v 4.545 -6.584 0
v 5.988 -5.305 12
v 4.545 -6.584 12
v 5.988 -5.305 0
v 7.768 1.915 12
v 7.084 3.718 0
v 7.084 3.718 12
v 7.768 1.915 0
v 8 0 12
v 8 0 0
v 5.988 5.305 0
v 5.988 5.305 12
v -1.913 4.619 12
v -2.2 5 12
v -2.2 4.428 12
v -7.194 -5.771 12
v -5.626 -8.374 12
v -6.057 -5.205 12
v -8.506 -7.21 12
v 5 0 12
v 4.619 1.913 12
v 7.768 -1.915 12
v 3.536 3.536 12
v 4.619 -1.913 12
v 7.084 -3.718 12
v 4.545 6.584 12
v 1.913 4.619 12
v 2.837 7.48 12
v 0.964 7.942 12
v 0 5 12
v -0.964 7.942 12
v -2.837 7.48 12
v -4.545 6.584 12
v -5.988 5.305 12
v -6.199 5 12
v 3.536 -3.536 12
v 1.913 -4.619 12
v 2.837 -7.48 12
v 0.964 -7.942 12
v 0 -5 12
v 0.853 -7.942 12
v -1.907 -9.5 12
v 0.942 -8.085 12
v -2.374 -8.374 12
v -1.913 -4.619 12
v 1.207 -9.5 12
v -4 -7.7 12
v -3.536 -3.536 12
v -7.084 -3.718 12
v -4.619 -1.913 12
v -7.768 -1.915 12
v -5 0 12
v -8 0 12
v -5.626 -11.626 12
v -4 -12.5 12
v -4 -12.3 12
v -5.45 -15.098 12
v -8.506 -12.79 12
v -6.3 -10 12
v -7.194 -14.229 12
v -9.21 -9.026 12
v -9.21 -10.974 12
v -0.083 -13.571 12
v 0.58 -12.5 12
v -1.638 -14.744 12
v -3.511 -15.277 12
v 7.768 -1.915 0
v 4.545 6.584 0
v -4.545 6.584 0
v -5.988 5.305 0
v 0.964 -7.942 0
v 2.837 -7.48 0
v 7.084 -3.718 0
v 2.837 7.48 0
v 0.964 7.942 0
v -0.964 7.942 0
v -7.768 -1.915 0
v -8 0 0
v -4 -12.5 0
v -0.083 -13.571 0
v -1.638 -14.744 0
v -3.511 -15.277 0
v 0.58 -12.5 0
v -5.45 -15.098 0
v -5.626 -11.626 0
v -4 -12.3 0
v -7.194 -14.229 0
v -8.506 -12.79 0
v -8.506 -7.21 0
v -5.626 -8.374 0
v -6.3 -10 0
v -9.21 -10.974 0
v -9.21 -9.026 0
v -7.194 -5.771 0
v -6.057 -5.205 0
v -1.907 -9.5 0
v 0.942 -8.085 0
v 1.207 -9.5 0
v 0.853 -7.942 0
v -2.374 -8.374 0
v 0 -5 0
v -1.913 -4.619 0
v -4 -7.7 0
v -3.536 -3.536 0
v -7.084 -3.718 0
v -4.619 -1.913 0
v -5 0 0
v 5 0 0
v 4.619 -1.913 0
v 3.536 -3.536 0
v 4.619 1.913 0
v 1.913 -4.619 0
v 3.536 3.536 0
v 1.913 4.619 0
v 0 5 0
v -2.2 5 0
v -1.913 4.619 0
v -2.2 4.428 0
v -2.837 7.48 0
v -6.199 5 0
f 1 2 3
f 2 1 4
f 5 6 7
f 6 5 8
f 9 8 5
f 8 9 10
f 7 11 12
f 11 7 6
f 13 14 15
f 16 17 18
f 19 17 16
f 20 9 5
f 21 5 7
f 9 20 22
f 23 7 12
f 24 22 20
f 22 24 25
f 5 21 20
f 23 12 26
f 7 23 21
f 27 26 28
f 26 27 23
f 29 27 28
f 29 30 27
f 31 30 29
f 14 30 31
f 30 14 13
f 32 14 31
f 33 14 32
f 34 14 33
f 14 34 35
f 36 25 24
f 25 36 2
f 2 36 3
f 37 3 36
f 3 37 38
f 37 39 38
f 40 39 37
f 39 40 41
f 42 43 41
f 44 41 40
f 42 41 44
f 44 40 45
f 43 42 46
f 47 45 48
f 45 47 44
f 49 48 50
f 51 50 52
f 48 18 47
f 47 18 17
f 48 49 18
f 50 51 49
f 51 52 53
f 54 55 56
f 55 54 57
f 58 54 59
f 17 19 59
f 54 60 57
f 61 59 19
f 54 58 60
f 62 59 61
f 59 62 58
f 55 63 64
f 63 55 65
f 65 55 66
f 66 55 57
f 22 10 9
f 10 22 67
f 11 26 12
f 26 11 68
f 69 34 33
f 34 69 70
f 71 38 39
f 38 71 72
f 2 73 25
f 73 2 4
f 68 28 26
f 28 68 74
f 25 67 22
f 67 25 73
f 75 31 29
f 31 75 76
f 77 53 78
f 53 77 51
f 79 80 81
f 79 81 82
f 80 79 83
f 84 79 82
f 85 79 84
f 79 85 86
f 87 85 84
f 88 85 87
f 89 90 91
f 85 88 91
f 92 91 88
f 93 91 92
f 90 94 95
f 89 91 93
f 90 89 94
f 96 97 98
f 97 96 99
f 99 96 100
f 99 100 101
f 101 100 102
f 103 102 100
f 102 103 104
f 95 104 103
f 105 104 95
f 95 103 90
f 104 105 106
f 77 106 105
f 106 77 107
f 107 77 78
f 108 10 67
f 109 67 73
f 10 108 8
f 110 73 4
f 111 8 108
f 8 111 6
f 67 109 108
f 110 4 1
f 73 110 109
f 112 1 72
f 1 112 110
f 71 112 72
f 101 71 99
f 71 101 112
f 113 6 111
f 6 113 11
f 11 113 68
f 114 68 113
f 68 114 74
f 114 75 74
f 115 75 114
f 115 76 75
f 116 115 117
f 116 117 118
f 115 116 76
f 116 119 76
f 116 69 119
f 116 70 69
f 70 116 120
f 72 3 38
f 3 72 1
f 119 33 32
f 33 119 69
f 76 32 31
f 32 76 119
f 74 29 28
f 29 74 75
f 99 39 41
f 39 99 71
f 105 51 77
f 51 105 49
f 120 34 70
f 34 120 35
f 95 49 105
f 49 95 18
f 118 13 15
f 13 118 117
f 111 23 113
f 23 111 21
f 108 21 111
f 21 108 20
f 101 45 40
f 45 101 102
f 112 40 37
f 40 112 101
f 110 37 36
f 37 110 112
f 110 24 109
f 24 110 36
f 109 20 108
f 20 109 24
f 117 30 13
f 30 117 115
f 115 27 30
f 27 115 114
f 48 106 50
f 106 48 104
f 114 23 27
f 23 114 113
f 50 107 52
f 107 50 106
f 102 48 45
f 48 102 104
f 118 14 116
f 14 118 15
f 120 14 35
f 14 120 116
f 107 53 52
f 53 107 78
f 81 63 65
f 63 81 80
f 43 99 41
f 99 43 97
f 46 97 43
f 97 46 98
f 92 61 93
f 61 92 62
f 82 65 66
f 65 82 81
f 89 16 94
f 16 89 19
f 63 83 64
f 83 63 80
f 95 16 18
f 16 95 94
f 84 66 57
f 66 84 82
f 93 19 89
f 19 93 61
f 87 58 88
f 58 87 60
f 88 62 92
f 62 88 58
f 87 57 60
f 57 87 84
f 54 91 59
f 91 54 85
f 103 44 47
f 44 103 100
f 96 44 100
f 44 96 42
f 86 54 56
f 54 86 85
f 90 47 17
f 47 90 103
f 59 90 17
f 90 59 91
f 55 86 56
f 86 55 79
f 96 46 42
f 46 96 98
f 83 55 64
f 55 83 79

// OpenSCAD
screen=9;
wire=3.6;
out_r=((3.6/2)+3+0.5);
union () {
difference () {
    cylinder ( h=12, r1=8, r2=8 );
    translate ( [0,0,-0.5] ) {
        cylinder ( h=13, r1=5, r2=5 );
    }
    translate ([-8.2,0,-0.1]) {
        cube ([6,5,13]);
    }
}

translate ([-4,-10,0]) {
    difference () {
        cylinder ( h=12, r1=out_r, r2=out_r);
        translate( [0,0,-0.5]) {
            cylinder ( h=13, r1=out_r-3, r2=out_r-3);
        }
        translate ([0,-2.5,-0.1]) {
            cube ([ 6,3,13]);
        }
    }
}
}
